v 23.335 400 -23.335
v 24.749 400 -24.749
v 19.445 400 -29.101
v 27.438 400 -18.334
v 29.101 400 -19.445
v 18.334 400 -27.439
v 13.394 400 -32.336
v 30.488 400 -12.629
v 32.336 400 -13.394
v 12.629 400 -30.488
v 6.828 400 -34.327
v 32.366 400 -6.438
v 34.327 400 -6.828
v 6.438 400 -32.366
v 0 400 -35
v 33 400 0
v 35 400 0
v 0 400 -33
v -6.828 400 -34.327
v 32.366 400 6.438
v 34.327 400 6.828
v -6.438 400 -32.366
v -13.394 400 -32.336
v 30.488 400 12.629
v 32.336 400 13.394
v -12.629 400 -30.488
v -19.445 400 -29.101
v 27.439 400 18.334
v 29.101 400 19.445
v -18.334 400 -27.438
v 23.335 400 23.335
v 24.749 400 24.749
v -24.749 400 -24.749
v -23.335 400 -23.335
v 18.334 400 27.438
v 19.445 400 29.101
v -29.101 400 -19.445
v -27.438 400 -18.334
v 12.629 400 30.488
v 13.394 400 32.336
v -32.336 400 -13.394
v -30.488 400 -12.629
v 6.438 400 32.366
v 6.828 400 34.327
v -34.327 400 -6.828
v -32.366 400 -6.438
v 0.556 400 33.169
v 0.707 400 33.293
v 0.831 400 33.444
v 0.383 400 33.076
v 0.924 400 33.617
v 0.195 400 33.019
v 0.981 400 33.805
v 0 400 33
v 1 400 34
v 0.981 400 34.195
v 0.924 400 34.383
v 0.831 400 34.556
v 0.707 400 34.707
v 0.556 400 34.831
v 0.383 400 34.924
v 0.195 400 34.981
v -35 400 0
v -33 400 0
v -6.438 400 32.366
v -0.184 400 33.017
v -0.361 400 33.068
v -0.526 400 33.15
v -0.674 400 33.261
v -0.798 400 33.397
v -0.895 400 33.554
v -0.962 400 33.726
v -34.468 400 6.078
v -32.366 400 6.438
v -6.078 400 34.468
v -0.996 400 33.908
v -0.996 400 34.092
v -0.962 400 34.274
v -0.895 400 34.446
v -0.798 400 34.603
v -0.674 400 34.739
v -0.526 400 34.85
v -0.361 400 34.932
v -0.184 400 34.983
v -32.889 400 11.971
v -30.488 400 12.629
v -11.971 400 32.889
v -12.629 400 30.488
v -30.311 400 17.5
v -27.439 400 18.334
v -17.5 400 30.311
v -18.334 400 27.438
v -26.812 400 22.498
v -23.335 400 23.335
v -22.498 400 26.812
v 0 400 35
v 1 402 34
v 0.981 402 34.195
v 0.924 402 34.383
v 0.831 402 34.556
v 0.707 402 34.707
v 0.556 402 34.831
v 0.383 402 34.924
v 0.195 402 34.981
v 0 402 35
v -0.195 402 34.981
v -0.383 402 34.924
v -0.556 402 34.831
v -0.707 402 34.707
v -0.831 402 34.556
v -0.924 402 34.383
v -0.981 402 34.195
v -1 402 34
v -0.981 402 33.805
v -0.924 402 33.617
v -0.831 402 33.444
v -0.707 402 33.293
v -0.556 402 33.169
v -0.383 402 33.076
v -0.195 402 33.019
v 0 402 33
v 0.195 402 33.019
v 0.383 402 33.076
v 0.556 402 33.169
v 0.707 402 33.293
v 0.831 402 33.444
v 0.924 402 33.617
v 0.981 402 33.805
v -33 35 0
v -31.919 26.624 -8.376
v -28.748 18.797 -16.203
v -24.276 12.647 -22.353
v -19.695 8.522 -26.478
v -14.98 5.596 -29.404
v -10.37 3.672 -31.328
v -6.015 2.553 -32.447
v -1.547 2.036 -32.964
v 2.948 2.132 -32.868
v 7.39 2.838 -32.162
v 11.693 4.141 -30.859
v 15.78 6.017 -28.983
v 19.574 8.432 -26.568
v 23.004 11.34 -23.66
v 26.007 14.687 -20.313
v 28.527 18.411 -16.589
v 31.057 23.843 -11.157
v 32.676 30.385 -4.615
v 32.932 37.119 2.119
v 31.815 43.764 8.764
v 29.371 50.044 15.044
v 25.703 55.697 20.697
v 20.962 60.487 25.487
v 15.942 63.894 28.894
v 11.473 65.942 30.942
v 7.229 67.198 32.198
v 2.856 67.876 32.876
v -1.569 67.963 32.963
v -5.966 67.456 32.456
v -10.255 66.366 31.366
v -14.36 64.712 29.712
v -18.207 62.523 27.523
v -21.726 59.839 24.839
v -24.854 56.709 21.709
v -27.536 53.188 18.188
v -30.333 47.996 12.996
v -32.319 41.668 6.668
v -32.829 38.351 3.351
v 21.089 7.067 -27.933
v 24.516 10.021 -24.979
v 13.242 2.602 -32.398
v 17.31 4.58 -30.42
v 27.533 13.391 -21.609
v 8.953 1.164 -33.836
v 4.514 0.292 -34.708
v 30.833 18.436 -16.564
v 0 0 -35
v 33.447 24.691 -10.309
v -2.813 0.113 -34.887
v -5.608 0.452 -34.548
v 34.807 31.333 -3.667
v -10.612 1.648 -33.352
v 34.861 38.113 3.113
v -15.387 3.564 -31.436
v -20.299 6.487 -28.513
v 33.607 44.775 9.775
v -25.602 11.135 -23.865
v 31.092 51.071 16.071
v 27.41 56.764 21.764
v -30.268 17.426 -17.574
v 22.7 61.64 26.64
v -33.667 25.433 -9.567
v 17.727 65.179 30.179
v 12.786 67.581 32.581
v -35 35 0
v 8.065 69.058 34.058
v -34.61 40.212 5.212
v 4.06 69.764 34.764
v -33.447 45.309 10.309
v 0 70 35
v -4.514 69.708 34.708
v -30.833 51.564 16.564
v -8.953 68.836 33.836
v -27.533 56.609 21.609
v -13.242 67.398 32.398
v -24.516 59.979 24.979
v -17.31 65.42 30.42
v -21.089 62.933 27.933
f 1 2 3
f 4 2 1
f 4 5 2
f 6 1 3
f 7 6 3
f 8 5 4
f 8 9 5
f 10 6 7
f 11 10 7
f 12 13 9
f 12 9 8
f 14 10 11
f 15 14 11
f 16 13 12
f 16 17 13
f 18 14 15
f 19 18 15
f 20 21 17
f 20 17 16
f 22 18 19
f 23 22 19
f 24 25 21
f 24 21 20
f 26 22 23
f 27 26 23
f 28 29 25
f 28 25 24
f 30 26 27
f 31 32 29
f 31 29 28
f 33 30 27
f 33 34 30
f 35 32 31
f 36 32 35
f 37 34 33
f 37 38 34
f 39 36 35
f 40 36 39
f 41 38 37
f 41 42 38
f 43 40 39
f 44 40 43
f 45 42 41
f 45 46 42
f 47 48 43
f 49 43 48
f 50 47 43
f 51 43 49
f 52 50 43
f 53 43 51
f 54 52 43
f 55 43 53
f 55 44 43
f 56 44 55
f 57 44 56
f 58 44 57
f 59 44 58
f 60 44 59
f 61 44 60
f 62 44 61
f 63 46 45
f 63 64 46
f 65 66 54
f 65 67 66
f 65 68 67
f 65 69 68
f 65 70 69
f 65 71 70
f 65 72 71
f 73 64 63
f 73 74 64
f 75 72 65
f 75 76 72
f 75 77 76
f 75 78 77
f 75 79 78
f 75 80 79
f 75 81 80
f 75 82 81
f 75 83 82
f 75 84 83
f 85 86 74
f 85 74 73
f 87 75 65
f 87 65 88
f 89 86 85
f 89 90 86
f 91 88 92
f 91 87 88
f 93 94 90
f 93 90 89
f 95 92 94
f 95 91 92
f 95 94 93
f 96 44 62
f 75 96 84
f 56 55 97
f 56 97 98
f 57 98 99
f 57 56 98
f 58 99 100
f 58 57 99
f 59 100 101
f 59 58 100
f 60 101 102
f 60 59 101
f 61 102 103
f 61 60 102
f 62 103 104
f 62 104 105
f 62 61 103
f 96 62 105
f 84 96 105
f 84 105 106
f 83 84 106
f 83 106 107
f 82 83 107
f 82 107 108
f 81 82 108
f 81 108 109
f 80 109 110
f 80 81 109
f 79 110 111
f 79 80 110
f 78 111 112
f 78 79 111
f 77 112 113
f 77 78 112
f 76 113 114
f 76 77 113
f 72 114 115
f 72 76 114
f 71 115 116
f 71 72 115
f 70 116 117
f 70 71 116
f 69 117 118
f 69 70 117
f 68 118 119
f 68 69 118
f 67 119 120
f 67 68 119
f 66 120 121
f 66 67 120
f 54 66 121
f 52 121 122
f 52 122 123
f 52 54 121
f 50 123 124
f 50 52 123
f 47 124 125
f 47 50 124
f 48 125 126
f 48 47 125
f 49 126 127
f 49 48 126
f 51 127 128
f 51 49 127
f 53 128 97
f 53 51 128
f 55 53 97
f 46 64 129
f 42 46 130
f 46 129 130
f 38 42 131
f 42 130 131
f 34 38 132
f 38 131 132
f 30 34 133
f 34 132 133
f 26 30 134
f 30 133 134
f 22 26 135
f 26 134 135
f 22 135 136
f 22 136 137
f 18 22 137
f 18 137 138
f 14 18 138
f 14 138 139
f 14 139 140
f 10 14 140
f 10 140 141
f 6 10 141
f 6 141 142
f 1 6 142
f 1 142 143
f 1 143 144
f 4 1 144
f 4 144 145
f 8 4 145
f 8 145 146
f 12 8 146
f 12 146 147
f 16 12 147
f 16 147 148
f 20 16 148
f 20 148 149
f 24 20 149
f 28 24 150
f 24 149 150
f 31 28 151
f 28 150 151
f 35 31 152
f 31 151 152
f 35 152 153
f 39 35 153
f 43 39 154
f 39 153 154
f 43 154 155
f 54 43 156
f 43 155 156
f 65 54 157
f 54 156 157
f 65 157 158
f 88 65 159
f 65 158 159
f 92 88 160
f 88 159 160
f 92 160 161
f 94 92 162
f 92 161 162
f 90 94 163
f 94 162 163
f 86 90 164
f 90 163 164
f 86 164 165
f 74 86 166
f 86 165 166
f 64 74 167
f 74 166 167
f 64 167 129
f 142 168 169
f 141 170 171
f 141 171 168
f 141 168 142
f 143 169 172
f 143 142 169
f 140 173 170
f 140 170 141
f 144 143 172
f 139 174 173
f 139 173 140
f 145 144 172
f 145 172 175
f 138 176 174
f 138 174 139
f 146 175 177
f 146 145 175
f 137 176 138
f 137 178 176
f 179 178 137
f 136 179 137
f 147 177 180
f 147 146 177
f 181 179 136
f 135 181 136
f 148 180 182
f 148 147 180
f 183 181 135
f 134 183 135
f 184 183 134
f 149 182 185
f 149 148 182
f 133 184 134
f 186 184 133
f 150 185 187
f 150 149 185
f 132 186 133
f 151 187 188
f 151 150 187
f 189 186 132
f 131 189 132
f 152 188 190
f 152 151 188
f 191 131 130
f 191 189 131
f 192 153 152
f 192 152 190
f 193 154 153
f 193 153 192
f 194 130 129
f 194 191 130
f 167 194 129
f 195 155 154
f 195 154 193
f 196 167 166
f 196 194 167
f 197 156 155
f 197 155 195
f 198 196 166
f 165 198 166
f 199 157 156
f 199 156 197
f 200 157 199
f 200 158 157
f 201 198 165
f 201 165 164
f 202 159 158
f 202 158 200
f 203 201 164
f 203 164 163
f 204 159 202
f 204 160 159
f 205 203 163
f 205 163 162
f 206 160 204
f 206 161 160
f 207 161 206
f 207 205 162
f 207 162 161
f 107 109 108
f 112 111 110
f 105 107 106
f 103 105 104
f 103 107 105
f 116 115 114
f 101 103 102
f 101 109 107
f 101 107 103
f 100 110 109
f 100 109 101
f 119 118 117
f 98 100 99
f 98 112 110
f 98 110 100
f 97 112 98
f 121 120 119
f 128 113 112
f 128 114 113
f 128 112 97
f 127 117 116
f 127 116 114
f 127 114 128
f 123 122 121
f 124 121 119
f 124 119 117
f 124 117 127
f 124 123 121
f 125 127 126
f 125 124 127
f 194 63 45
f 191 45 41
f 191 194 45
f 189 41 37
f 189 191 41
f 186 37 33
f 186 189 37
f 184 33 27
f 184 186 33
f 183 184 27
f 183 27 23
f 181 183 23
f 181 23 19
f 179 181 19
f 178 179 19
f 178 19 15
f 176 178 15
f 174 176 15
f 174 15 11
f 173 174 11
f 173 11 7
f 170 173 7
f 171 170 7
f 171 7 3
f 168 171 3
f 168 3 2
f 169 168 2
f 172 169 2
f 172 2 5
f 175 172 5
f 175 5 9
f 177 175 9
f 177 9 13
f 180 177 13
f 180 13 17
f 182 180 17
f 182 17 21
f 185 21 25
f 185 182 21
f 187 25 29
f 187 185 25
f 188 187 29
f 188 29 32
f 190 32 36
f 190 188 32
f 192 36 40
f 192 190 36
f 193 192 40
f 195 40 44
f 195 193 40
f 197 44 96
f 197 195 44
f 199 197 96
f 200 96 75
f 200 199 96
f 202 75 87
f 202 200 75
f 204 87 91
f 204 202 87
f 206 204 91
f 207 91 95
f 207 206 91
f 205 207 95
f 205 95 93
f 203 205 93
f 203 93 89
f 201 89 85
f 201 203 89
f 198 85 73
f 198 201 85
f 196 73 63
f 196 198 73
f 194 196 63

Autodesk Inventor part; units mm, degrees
ref_plane "YZ Plane" through (0, 0, 0) normal (1, 0, 0) x (0, 1, 0)
ref_plane "XZ Plane" through (0, 0, 0) normal (0, 1, 0) x (-1, 0, 0)
ref_plane "XY Plane" through (0, 0, 0) normal (0, 0, 1) x (1, 0, 0)
sketch "Sketch1" plane through (0, 0, 0) normal (0, 1, 0) x (-1, 0, 0)
  circle A0 centre (0, 0) radius 35
  circle A1 centre (0, 0) radius 33
  dimension "d0" = 2
  dimension "d1" = 70
extrude "Extrusion1" add sketch "Sketch1" along normal blind 400
sketch "Sketch2" plane through (0, 0, 0) normal (1, 0, 0) x (0, 1, 0)
  line L0 (0, -35) -> (0, 35) projected
  line L1 (0, -35) -> (70, 35)
  line L2 (0, 35) -> (400, 35) projected
  point P0 (0, 0)
  dimension "d4" = 70
extrude "Extrusion2" cut sketch "Sketch2" along normal through all both and the other way through all
sketch "Sketch4" plane through (0, 400, 0) normal (0, 1, 0) x (1, 0, 0)
  circle A0 centre (0, -34) radius 1
  circle A1 centre (0, 0) radius 33 projected
  circle A2 centre (0, 0) radius 35 projected
extrude "Extrusion4" add sketch "Sketch4" along normal blind 2 contours A0
properties part number "Feul_Intake"
